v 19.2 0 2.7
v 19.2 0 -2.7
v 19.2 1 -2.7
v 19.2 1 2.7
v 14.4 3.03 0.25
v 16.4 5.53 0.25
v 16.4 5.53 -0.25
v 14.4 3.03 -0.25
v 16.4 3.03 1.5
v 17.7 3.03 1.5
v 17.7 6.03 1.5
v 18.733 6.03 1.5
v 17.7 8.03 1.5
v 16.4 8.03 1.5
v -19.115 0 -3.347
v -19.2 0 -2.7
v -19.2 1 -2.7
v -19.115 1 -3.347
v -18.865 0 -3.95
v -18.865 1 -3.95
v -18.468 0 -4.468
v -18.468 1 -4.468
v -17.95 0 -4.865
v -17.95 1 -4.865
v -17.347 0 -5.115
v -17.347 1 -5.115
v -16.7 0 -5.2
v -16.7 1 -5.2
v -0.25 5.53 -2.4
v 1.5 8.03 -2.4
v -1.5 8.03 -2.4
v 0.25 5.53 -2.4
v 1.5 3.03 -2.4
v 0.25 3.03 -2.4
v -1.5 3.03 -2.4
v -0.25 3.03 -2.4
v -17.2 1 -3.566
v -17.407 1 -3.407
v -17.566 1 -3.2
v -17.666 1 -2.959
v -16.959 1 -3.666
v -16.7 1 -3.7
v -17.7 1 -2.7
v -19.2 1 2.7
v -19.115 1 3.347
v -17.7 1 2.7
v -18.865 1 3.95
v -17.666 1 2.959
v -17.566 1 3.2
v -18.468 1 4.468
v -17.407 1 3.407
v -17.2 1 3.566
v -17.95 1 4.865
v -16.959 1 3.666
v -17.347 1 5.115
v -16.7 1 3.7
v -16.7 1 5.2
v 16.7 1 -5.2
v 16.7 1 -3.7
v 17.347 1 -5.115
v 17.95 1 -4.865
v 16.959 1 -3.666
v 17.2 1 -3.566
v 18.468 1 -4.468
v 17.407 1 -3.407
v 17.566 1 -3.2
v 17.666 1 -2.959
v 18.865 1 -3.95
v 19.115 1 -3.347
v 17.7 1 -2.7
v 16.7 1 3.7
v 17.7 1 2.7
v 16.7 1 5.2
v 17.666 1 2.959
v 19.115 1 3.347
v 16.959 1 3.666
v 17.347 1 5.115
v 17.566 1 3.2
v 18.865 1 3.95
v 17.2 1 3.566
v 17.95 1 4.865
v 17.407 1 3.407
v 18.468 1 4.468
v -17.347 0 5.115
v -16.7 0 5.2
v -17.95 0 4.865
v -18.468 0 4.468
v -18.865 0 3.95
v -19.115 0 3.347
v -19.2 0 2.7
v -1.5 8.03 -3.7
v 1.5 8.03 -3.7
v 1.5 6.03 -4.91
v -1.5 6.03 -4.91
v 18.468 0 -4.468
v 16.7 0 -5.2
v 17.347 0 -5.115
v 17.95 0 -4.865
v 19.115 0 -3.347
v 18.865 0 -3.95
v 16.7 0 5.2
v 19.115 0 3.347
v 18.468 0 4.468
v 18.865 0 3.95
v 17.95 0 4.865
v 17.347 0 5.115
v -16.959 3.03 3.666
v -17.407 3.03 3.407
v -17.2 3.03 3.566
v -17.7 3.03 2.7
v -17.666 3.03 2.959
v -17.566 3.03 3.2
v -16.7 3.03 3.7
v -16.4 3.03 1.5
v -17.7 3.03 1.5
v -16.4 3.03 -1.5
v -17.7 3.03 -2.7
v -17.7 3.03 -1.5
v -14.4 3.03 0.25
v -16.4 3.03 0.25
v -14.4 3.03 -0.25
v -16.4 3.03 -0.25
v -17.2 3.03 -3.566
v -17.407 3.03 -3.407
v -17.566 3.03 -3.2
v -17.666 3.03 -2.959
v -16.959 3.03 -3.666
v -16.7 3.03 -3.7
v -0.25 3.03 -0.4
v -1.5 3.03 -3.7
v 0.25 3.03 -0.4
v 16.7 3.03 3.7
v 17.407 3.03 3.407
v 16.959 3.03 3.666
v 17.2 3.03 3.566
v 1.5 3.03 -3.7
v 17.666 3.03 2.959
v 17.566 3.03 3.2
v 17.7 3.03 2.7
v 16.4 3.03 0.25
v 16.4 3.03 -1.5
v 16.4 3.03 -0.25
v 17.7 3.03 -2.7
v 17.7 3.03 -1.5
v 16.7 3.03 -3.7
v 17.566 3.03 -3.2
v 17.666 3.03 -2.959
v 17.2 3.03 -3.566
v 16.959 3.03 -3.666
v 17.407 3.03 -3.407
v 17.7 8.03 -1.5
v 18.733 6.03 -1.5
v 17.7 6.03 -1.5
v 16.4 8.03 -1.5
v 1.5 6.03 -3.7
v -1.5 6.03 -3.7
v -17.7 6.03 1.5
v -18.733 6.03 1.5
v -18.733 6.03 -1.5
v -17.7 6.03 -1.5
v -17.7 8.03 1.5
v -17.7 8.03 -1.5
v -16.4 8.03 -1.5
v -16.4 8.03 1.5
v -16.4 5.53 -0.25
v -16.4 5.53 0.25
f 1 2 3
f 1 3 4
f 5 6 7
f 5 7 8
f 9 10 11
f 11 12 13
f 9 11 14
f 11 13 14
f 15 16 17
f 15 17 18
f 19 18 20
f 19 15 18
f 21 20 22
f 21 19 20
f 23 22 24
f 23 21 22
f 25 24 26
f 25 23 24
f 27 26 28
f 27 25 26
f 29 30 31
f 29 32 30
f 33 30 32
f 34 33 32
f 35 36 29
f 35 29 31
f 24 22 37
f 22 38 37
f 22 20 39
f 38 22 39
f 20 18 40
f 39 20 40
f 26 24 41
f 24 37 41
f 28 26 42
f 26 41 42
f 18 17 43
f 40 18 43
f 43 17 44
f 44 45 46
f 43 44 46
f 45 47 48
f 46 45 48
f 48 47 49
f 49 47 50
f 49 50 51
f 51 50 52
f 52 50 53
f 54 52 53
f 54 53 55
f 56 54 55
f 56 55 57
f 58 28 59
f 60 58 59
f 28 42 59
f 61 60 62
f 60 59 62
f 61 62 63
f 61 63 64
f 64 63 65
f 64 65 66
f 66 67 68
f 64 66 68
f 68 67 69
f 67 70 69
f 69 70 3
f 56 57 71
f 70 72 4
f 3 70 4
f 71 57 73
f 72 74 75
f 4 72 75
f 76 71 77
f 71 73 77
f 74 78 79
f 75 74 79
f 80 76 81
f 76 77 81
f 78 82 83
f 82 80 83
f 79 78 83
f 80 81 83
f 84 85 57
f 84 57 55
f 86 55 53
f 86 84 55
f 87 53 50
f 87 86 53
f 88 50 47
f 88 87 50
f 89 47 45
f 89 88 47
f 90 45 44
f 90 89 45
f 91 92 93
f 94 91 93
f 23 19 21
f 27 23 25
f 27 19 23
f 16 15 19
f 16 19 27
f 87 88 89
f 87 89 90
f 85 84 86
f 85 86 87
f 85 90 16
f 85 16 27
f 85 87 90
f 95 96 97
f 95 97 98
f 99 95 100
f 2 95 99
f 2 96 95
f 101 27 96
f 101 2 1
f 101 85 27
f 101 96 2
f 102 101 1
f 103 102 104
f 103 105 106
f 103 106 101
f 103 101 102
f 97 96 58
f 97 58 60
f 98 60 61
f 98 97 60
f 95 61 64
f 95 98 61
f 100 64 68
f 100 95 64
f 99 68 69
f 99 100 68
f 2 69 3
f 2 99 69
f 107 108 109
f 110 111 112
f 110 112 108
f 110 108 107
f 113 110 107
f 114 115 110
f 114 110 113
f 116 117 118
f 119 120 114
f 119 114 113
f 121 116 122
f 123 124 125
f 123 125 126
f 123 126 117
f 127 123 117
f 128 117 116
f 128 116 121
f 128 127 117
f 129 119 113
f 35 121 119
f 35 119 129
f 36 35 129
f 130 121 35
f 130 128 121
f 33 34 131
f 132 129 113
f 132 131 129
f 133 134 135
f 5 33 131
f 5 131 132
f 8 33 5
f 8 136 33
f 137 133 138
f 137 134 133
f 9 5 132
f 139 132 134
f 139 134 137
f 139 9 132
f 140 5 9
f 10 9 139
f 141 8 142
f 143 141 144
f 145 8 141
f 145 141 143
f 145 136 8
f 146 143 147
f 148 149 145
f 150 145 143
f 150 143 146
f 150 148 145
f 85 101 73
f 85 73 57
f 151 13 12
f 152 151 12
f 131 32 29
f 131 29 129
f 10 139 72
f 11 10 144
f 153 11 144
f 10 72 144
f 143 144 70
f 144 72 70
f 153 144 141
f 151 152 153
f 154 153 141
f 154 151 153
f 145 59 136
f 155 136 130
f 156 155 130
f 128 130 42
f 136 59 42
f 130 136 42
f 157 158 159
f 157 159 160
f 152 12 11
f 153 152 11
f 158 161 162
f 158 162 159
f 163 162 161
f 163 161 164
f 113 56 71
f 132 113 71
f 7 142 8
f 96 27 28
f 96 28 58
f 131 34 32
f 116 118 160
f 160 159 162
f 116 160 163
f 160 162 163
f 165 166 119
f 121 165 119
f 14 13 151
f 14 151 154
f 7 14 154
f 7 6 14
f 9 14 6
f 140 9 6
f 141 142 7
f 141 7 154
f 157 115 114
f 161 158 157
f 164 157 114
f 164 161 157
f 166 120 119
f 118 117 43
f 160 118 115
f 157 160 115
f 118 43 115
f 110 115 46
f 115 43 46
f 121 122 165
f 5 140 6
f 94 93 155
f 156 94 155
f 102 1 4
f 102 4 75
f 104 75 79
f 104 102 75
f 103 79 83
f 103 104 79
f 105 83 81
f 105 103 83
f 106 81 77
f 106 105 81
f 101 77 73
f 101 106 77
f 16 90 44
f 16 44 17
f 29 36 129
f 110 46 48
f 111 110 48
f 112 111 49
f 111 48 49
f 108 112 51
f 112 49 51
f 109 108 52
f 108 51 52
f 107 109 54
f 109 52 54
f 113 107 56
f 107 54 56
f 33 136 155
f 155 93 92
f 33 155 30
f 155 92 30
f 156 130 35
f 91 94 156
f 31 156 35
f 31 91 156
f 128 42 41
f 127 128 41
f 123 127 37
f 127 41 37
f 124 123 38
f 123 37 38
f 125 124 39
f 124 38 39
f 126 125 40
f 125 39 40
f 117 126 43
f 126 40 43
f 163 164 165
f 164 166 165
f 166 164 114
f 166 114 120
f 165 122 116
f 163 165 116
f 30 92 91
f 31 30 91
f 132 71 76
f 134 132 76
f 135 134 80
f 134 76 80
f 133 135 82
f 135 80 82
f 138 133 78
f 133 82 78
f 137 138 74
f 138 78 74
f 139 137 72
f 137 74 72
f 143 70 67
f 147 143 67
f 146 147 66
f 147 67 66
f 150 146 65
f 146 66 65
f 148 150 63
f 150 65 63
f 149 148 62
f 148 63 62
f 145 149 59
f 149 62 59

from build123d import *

# Parameters (mm, degrees)
BOSS_EXTRUDE1_DEPTH = 3.03
BOSS_EXTRUDE2_DEPTH = 1
SKETCH3_W           = 1.3
SKETCH3_H           = 3
SKETCH3_W_2         = 1.5
SKETCH3_H_2         = 1.3
BOSS_EXTRUDE3_DEPTH = 5
BOSS_EXTRUDE4_DEPTH = 3
BOSS_EXTRUDE5_DEPTH = 1.5
SKETCH9_W           = 0.5
SKETCH9_H           = 2.5
BOSS_EXTRUDE6_DEPTH = 2
CUT_EXTRUDE1_DEPTH  = 0.5
SKETCH11_W          = 0.25
SKETCH11_H          = 2.5
BOSS_EXTRUDE7_DEPTH = 2
CUT_EXTRUDE2_DEPTH  = 0.25


with BuildPart() as part:
    # Sketch1 → Boss-Extrude1 (new body)
    with BuildSketch(Plane(origin=(0, 0, 0), x_dir=(1, 0, 0), z_dir=(0, 1, 0))):
        with BuildLine():
            Line((-16.7, -3.7), (16.7, -3.7))
            ThreePointArc((16.7, -3.7), (17.407106781, -3.407106781), (17.7, -2.7))
            Line((17.7, -2.7), (17.7, 2.7))
            ThreePointArc((17.7, 2.7), (17.407106781, 3.407106781), (16.7, 3.7))
            Line((16.7, 3.7), (-16.7, 3.7))
            ThreePointArc((-16.7, 3.7), (-17.407106781, 3.407106781), (-17.7, 2.7))
            Line((-17.7, 2.7), (-17.7, -2.7))
            ThreePointArc((-17.7, -2.7), (-17.407106781, -3.407106781), (-16.7, -3.7))
        make_face()
    extrude(amount=BOSS_EXTRUDE1_DEPTH)

    # Sketch2 → Boss-Extrude2 (add)
    with BuildSketch(Plane.XZ):
        with BuildLine():
            Line((16.7, 5.2), (-16.7, 5.2))
            ThreePointArc((-16.7, 5.2), (-18.467766953, 4.467766953), (-19.2, 2.7))
            Line((-19.2, 2.7), (-19.2, -2.7))
            ThreePointArc((-19.2, -2.7), (-18.467766953, -4.467766953), (-16.7, -5.2))
            Line((-16.7, -5.2), (16.7, -5.2))
            ThreePointArc((16.7, -5.2), (18.467766953, -4.467766953), (19.2, -2.7))
            Line((19.2, -2.7), (19.2, 2.7))
            ThreePointArc((19.2, 2.7), (18.467766953, 4.467766953), (16.7, 5.2))
        make_face()
    extrude(amount=-BOSS_EXTRUDE2_DEPTH)

    # Sketch3 → Boss-Extrude3 (add)
    with BuildSketch(Plane(origin=(0, 3.03, 0), x_dir=(1, 0, 0), z_dir=(0, 1, 0))):
        with Locations((-17.05, 0)):
            Rectangle(SKETCH3_W, SKETCH3_H)
        with Locations((-0.75, 3.05)):
            Rectangle(SKETCH3_W_2, SKETCH3_H_2)
    boss_extrude3 = extrude(amount=BOSS_EXTRUDE3_DEPTH)

    # Sketch5 → Boss-Extrude4 (add)
    with BuildSketch(Plane.XY.offset(1.5)):
        Polygon((-17.7, 8.03), (-18.733327763, 6.03), (-17.7, 6.03), align=None)
    boss_extrude4 = extrude(amount=-BOSS_EXTRUDE4_DEPTH)

    # Sketch8 → Boss-Extrude5 (add)
    with BuildSketch(Plane.ZY.offset(1.5)):
        Polygon((-3.7, 8.03), (-4.910348547, 6.03), (-3.7, 6.03), align=None)
    boss_extrude5 = extrude(amount=-BOSS_EXTRUDE5_DEPTH)

    # Sketch9 → Boss-Extrude6 (add)
    with BuildSketch(Plane(origin=(-16.4, 0, 0), x_dir=(0, 0, -1), z_dir=(1, 0, 0))):
        with Locations((0, 4.28)):
            Rectangle(SKETCH9_W, SKETCH9_H)
    boss_extrude6 = extrude(amount=BOSS_EXTRUDE6_DEPTH)

    # Sketch10 → Cut-Extrude1 (cut)
    with BuildSketch(Plane.XY.offset(0.25)):
        Polygon((-16.4, 5.53), (-14.4, 3.03), (-14.4, 5.53), align=None)
    cut_extrude1 = extrude(amount=-CUT_EXTRUDE1_DEPTH, mode=Mode.SUBTRACT)

    # Sketch11 → Boss-Extrude7 (add)
    with BuildSketch(Plane.XY.offset(-2.4)):
        with Locations((-0.125, 4.28)):
            Rectangle(SKETCH11_W, SKETCH11_H)
    boss_extrude7 = extrude(amount=BOSS_EXTRUDE7_DEPTH)

    # Sketch12 → Cut-Extrude2 (cut)
    with BuildSketch(Plane.ZY.offset(0.25)):
        Polygon((-2.4, 5.53), (-0.4, 3.03), (-0.4, 5.53), align=None)
    cut_extrude2 = extrude(amount=-CUT_EXTRUDE2_DEPTH, mode=Mode.SUBTRACT)

    # Mirror1: Boss-Extrude3, Boss-Extrude4, Boss-Extrude5, Boss-Extrude6, Cut-Extrude1, Boss-Extrude7, Cut-Extrude2 across plane
    add(boss_extrude3.mirror(Plane(origin=(0, 0, 0), x_dir=(0, 0, 1), z_dir=(1, 0, 0))))
    add(boss_extrude4.mirror(Plane(origin=(0, 0, 0), x_dir=(0, 0, 1), z_dir=(1, 0, 0))))
    add(boss_extrude5.mirror(Plane(origin=(0, 0, 0), x_dir=(0, 0, 1), z_dir=(1, 0, 0))))
    add(boss_extrude6.mirror(Plane(origin=(0, 0, 0), x_dir=(0, 0, 1), z_dir=(1, 0, 0))))
    add(cut_extrude1.mirror(Plane(origin=(0, 0, 0), x_dir=(0, 0, 1), z_dir=(1, 0, 0))), mode=Mode.SUBTRACT)
    add(boss_extrude7.mirror(Plane(origin=(0, 0, 0), x_dir=(0, 0, 1), z_dir=(1, 0, 0))))
    add(cut_extrude2.mirror(Plane(origin=(0, 0, 0), x_dir=(0, 0, 1), z_dir=(1, 0, 0))), mode=Mode.SUBTRACT)


solid = part.part
